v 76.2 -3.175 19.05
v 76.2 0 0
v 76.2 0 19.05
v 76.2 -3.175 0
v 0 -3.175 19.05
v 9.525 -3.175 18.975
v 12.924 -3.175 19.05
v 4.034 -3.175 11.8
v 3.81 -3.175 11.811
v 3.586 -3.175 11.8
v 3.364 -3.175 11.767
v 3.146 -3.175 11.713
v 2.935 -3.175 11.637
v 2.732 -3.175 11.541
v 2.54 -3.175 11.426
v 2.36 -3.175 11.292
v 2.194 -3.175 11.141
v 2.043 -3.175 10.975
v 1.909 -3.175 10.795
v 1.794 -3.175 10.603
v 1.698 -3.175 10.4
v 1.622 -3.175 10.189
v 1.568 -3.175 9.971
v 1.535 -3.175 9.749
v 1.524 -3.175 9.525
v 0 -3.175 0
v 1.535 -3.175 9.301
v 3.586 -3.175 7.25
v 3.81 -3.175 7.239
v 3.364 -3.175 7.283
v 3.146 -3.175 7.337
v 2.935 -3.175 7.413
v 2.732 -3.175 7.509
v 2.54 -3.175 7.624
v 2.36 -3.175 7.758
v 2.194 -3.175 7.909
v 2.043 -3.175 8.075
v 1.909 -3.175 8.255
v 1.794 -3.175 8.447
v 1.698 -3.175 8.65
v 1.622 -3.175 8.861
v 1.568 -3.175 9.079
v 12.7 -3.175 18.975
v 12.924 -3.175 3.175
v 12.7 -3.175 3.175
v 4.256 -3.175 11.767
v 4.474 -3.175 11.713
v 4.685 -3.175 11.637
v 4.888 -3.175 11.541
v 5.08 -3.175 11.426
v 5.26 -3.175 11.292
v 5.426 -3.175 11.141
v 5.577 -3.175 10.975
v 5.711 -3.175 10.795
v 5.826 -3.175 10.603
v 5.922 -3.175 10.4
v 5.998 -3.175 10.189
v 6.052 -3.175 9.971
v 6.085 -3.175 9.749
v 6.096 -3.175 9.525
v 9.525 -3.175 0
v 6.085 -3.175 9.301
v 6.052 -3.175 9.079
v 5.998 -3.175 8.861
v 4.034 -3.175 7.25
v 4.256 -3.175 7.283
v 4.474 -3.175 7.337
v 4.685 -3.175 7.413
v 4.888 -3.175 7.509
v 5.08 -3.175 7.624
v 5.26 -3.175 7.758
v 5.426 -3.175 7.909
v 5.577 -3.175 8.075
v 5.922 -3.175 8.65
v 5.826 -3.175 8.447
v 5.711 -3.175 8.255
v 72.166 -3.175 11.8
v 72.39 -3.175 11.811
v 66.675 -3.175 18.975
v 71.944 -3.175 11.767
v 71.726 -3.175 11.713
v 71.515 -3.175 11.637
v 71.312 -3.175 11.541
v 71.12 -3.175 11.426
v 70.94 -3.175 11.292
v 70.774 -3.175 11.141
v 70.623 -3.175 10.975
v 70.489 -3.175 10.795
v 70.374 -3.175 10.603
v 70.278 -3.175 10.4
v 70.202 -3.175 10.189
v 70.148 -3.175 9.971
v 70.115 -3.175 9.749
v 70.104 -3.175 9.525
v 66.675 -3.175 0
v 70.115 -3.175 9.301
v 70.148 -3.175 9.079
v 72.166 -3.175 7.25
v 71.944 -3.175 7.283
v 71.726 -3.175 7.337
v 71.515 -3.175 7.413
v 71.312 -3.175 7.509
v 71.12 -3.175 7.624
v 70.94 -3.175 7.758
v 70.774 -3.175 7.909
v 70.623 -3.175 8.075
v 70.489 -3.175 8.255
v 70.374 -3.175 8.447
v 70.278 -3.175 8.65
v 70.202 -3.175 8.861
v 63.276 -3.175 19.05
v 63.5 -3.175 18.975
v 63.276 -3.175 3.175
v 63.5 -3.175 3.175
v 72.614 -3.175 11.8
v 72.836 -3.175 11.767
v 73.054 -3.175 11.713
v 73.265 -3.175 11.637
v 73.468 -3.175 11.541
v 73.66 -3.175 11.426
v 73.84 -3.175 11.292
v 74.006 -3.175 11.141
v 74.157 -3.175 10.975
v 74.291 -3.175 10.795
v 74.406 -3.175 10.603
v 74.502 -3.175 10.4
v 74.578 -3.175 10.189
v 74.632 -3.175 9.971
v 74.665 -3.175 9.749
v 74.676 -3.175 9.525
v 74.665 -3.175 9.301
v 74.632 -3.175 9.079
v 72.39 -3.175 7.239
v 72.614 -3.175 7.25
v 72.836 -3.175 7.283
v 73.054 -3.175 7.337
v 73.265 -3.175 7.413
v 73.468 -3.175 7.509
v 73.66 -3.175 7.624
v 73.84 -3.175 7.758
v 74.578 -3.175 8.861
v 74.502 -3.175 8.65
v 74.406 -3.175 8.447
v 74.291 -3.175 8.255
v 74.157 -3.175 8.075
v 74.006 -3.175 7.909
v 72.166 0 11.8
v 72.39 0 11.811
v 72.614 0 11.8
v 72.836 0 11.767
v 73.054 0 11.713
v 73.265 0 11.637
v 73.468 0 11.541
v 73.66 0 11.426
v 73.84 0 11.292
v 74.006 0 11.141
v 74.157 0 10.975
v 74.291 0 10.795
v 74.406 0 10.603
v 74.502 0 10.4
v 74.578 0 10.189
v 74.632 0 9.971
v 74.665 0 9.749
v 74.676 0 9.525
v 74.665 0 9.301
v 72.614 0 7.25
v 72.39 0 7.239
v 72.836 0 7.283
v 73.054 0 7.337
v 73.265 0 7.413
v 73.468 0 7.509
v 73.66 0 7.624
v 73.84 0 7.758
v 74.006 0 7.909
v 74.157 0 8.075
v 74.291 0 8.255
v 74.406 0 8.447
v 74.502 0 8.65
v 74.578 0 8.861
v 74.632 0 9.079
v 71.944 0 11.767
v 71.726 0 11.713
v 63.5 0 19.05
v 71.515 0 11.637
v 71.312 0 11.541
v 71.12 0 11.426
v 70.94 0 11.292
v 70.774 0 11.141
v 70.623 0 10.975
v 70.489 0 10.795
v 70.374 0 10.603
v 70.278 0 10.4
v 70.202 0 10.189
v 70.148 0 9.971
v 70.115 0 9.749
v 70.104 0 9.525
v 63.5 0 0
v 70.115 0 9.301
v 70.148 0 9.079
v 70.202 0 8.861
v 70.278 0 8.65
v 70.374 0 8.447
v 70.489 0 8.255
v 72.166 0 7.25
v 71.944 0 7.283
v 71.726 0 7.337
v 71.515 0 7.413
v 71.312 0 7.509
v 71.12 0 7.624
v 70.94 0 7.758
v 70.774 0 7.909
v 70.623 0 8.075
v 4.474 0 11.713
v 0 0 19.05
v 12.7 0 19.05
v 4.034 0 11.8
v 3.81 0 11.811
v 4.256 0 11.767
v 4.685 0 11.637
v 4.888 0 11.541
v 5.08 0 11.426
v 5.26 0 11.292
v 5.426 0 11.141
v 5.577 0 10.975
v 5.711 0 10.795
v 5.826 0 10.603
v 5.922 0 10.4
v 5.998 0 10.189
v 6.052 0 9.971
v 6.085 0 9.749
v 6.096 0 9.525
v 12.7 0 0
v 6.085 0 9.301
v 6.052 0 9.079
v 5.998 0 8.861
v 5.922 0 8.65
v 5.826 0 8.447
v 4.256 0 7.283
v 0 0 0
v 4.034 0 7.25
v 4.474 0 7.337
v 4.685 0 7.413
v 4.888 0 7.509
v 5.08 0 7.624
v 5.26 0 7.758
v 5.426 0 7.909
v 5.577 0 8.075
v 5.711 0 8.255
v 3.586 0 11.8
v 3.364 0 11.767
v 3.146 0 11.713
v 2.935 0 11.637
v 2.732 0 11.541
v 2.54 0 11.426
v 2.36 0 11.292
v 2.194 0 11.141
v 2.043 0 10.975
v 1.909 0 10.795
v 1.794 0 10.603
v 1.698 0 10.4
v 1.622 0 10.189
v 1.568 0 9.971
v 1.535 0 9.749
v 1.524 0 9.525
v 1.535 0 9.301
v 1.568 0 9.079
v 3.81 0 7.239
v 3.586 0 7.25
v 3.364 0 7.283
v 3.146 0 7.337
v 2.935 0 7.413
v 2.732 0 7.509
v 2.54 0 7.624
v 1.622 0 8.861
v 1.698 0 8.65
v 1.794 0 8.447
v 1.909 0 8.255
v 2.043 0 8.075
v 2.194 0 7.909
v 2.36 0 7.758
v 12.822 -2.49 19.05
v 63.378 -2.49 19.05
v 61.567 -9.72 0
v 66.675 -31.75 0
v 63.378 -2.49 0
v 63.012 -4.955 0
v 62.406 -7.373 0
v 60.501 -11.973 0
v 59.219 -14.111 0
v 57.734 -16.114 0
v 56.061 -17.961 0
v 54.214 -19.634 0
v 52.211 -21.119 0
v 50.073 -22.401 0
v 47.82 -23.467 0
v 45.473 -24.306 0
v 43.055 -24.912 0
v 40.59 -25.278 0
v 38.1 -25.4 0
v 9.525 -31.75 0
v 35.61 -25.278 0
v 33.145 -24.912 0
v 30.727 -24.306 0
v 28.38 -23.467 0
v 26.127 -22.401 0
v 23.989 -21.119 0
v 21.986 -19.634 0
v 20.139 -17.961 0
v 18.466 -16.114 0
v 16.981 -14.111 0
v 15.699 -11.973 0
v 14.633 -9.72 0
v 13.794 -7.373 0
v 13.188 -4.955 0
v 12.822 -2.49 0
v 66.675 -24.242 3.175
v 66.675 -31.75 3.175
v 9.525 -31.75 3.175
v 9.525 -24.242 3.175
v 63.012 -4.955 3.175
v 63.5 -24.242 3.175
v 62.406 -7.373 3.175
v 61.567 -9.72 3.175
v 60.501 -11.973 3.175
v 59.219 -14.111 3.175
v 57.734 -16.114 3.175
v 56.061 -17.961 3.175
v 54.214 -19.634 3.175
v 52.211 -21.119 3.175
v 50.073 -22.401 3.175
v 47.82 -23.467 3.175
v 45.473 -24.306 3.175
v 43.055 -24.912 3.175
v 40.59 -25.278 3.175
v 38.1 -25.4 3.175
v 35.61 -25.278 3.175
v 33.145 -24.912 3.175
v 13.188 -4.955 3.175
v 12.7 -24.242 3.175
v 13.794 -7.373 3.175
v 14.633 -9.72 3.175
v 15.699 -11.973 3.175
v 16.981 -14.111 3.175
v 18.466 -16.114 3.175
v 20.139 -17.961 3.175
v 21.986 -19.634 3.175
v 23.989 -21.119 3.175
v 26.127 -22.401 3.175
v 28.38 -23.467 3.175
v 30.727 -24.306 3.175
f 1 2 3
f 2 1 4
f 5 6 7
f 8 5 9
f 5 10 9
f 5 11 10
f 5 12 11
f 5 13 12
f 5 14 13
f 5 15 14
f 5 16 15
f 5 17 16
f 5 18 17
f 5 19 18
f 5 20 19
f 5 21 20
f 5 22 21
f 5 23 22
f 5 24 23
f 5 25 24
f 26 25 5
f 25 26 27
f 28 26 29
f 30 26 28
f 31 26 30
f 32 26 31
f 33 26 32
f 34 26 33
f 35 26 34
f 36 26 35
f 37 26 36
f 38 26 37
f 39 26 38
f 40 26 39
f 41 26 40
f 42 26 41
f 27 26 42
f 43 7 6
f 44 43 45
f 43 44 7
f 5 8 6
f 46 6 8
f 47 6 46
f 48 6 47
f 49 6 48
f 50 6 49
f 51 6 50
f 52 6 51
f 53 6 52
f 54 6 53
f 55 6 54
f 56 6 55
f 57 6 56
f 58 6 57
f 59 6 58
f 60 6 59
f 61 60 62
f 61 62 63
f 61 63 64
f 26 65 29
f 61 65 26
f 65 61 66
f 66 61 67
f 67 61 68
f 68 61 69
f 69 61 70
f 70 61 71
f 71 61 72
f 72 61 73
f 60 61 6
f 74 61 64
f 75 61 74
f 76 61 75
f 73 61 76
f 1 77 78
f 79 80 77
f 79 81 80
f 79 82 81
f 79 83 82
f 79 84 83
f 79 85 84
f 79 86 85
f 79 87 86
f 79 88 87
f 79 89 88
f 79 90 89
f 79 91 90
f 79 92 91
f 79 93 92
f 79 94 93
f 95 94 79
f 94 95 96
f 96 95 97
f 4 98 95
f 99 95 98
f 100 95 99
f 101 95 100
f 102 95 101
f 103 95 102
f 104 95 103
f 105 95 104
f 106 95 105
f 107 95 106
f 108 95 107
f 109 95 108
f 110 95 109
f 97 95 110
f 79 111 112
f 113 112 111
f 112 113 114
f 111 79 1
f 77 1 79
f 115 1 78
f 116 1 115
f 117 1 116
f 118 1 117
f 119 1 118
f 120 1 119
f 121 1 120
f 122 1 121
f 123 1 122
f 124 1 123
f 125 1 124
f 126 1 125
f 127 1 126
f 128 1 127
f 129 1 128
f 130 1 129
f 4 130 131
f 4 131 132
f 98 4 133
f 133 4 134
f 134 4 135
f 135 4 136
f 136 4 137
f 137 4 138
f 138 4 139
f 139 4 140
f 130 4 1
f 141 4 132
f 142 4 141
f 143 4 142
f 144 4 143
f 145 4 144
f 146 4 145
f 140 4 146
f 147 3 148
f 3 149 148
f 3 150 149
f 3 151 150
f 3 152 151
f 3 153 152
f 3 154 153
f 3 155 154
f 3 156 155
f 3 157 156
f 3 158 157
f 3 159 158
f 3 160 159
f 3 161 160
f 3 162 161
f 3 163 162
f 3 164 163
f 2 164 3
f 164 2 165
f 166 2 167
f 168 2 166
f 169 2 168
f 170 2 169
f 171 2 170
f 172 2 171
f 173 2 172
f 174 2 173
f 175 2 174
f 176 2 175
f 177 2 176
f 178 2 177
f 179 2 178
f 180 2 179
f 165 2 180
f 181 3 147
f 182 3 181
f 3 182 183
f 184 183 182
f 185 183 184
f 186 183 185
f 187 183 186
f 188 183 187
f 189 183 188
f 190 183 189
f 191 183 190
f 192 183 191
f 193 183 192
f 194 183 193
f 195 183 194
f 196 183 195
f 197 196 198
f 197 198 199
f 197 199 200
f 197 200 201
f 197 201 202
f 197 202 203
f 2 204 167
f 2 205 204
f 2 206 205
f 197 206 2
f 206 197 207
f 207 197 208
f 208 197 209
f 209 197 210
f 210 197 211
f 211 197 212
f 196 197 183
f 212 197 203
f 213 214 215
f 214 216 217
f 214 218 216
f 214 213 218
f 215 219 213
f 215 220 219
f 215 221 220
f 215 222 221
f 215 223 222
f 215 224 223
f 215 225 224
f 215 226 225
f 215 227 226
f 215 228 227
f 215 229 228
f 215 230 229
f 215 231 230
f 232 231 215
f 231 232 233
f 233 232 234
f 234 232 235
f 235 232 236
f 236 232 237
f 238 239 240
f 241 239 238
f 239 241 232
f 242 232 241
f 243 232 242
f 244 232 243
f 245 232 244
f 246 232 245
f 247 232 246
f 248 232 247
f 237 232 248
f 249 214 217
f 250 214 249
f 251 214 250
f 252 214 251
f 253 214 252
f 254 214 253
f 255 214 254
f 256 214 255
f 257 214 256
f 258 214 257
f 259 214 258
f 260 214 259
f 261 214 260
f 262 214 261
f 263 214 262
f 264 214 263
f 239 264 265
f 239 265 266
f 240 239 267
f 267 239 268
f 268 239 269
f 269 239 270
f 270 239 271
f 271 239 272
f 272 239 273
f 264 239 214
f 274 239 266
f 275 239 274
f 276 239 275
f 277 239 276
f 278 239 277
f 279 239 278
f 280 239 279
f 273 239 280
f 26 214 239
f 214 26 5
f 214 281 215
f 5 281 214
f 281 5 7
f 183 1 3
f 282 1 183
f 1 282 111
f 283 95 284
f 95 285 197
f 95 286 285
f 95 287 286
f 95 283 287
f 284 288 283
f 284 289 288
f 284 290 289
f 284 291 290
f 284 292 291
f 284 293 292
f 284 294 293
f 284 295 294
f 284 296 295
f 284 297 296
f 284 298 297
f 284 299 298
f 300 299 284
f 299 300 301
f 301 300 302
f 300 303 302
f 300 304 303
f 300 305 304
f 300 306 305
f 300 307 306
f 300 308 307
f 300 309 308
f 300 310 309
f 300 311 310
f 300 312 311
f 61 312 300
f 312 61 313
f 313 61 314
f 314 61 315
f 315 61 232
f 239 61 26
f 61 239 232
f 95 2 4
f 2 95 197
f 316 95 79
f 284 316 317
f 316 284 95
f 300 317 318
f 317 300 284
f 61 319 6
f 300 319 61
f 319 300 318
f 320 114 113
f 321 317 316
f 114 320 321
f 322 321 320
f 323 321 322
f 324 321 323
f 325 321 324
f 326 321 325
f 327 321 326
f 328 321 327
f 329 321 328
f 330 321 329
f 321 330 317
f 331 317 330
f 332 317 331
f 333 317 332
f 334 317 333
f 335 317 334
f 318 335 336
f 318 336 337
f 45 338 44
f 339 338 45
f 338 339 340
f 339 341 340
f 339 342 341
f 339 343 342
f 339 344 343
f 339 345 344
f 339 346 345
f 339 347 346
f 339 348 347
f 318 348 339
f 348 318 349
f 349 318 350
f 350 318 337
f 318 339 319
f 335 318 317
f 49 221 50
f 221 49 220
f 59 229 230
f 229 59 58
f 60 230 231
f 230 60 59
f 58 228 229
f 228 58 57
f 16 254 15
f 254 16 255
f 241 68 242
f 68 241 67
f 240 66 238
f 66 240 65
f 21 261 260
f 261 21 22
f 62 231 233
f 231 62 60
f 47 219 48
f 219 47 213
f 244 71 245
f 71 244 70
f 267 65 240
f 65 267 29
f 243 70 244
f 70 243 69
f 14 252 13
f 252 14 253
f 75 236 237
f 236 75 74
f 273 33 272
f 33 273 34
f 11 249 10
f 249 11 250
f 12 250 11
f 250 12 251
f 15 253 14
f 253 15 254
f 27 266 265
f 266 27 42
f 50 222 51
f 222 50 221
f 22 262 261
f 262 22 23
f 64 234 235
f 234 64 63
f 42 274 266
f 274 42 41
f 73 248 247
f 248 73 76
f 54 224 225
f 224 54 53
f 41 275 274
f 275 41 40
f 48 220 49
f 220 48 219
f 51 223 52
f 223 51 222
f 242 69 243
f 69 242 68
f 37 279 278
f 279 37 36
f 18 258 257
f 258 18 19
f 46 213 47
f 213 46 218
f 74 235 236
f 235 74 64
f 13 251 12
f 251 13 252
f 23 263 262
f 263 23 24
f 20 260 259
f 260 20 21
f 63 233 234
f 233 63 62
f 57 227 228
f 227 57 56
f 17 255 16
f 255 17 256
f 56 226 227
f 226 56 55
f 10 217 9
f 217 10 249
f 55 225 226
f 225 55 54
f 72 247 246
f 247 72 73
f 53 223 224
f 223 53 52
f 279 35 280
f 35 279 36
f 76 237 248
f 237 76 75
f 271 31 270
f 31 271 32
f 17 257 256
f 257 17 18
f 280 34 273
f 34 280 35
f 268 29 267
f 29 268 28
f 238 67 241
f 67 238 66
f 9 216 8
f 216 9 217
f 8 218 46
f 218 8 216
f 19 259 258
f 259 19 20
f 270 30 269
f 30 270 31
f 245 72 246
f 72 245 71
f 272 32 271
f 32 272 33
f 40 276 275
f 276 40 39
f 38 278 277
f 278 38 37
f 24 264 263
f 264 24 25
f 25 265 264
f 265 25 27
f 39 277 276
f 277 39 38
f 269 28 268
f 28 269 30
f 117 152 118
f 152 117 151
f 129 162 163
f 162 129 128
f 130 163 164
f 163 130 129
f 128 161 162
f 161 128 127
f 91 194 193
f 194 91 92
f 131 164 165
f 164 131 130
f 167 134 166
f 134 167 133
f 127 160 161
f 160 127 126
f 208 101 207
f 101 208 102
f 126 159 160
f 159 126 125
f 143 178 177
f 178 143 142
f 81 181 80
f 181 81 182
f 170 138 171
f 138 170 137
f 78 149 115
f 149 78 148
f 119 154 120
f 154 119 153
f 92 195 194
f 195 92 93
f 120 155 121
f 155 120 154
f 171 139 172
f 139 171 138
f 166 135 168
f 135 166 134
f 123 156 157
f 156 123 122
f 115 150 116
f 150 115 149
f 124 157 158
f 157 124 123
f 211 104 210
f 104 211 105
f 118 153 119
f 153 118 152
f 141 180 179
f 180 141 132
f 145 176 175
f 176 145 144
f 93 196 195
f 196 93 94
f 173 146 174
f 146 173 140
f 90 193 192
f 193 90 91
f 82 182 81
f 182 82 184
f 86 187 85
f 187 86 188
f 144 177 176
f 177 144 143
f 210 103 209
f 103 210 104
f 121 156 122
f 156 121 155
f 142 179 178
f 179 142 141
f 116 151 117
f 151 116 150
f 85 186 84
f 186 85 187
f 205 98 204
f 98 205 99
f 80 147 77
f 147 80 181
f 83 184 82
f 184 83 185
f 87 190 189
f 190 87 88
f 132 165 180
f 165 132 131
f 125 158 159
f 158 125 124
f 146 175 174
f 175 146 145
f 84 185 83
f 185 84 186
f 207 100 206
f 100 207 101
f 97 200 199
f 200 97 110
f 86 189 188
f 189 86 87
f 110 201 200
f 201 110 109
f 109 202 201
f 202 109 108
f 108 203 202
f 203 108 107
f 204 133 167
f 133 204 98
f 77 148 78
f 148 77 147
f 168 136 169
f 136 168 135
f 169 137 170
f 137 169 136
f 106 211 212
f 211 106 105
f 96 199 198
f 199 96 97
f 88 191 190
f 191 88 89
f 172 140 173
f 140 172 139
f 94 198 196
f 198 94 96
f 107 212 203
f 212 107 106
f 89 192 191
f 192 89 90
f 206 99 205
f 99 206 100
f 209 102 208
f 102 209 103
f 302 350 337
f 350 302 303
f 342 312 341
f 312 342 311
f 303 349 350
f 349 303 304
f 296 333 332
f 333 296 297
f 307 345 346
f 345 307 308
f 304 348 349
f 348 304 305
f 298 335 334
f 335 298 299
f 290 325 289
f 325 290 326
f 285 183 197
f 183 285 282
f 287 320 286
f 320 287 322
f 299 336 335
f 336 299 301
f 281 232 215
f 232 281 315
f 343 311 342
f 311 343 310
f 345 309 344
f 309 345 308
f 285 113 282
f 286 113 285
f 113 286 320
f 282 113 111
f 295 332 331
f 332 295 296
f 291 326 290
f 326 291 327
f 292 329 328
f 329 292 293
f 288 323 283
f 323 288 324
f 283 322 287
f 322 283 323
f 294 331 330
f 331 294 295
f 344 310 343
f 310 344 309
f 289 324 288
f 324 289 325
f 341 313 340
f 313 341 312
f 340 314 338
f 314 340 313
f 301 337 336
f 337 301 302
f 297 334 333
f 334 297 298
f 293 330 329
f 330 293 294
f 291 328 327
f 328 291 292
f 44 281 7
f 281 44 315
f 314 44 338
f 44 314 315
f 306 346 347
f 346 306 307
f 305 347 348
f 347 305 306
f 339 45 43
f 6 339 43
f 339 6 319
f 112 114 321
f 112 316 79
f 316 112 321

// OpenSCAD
//
// CRT support
//
// CRT neck support 2" dia
// Height 1.25 inch above base
// 4 inch width for base
//
// bottom half for version with clamp
//

$fn=64;
e=0.1;

function mm(x)=x*25.4;

module hole_at(x,y,dia) {
     translate( [x, y, -e])
	  cylinder( h=thk+2*e, d=dia);
}

crt_dia = mm(2.0);
crt_hgt = mm(1.25);

sup_hgt = mm(1);
sup_wid = crt_dia+mm(0.25);

thk = mm(0.125);

base_wid = mm(4);
base_len = mm(1);

hole_dia = mm(0.18);
hole_off = mm(0.25);

clamp_wid = mm(3);
clamp_len = mm(0.75);

ch_off = mm(0.15);

module sup() {
     difference() {
	  cube( [sup_wid, crt_hgt+sup_hgt, thk]);
	  translate( [sup_wid/2, crt_hgt+crt_dia/2, -e])
	       cylinder( h=thk+2*e, d=crt_dia);
     }
}

module base() {
     difference() {
	  cube( [base_wid, base_len, thk]);
	  hole_at( hole_off, (base_len-thk)/2, hole_dia);
	  hole_at( base_wid-hole_off, (base_len-thk)/2, hole_dia);
     }
}

module side() {
     linear_extrude( height=thk) {
	  polygon( points = [[0,0], [0, base_len-thk], [crt_hgt, 0]]);
     }
}

module side2() {
     linear_extrude( height=thk) {
	  polygon( points = [[0, 0], [clamp_len, 0], [0, sup_hgt]]);
     }
}

module bracket() {
     translate( [0, thk, 0]) rotate( [90, 0, 0]) sup();
     translate( [ -(base_wid-sup_wid)/2, 0, 0])
	  base();
     translate( [thk, thk-e, 0]) rotate( [0, -90, 0]) side();
     translate( [sup_wid, thk-e, 0]) rotate( [0, -90, 0]) side();
}

module clamp() {
     difference() {
	  cube( [clamp_wid, clamp_len, thk]);
	  hole_at( ch_off, clamp_len/2, hole_dia);
	  hole_at( clamp_wid-ch_off, clamp_len/2, hole_dia);
	  translate( [clamp_wid/2, -e, thk])
	       rotate( [-90, 0, 0])
	       cylinder( h=clamp_len+2*e, d=crt_dia);
     }
}

module bottom() {
     translate( [thk, 0, sup_hgt+crt_hgt]) rotate( [-90, 0, 90]) side2();
     translate( [sup_wid, 0, sup_hgt+crt_hgt]) rotate( [-90, 0, 90]) side2();
     bracket();
     translate( [ -(clamp_wid-sup_wid)/2, 0, sup_wid-thk])  clamp();
}

module top() {
     difference() {
	  union() {
	       cube( [clamp_wid, clamp_len, thk]);
	       translate( [(clamp_wid-sup_wid)/2, 0, 0])
		    cube( [sup_wid, thk, crt_dia/2+mm(0.25)]);
	  }
	  hole_at( ch_off, clamp_len/2, hole_dia);
	  hole_at( clamp_wid-ch_off, clamp_len/2, hole_dia);
	  translate( [clamp_wid/2, -e, 0])
	       rotate( [-90, 0, 0])
	       cylinder( h=clamp_len+2*e, d=crt_dia);
     }
     translate( [(clamp_wid-crt_dia)/2-thk, 0, thk-e]) rotate( [90, 0, 90]) side2();
     translate( [clamp_wid-(clamp_wid-crt_dia)/2, 0, thk-e]) rotate( [90, 0, 90]) side2();
}

module crt() {
     color("grey") cylinder( h=mm(2.5), d=crt_dia);
}

crt_raise = 0.5;
raise=1;

// bottom bracket
rotate( [90, 0, 0])
// bottom();

// top clamp
//translate( [ -(clamp_wid-sup_wid)/2, 0, sup_wid+raise])
top();

// CRT neck
// translate( [sup_wid/2, mm(1), crt_hgt+crt_dia/2+crt_raise]) rotate( [90, 0, 0]) crt();
